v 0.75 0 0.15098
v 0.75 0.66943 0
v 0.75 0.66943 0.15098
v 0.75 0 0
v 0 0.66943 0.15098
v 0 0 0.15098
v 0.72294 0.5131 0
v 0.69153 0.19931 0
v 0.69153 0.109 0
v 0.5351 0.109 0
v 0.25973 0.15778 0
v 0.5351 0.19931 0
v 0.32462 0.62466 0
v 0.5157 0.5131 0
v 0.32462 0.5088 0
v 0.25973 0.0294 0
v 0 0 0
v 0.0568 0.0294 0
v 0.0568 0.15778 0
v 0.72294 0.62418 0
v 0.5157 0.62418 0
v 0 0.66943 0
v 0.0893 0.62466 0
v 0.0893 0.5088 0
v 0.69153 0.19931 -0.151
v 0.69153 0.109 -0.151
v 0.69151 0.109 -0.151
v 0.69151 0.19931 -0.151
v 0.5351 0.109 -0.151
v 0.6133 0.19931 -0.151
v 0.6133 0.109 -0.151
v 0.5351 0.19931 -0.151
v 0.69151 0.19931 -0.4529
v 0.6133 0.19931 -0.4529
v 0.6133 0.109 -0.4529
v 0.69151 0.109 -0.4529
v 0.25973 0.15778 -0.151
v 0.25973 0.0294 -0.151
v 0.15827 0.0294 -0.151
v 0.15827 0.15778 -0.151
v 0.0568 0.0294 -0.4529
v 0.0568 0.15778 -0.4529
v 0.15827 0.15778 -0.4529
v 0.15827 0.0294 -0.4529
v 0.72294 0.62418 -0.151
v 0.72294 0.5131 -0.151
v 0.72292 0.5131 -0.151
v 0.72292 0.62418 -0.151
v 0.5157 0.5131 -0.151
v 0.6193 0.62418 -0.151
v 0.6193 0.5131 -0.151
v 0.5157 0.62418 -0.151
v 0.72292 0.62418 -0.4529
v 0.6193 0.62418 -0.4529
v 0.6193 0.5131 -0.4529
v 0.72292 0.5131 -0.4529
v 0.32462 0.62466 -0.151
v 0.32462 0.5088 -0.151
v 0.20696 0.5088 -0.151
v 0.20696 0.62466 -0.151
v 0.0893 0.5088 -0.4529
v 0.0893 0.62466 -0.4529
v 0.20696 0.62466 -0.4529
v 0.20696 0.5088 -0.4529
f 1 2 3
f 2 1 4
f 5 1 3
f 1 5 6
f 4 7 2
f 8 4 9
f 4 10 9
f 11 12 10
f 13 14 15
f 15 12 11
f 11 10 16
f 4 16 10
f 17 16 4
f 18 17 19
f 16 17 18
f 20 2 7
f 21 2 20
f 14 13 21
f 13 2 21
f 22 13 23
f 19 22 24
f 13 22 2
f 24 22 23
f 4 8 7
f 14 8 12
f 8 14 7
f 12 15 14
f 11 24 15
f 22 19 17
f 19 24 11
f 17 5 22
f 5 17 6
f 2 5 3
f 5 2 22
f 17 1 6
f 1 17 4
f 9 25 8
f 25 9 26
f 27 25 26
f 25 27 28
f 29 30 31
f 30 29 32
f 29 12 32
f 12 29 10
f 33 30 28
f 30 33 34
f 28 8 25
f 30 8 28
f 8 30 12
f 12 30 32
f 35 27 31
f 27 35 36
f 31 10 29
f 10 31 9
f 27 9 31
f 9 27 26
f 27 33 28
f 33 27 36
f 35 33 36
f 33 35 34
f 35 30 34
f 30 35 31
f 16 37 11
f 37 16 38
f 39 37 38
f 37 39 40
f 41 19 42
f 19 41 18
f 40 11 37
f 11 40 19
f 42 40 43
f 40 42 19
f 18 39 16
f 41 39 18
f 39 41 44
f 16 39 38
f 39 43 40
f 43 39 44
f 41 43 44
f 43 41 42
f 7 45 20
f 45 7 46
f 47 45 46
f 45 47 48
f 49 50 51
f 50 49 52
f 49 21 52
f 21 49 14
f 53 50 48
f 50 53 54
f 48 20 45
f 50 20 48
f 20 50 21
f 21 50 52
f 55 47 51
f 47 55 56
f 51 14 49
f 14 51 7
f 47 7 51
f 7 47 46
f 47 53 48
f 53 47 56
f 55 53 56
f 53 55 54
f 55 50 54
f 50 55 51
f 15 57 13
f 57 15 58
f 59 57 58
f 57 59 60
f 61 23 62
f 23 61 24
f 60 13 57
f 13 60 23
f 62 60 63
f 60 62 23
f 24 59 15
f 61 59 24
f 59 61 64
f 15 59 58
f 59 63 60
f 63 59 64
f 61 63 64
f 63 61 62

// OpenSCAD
// Base dimensions
base_length = 0.75;
base_width = 0.669426;
base_height = 0.150979;

// Pad depth parameters
shallow_depth = 0.151;
deep_start_below = 0.1509;
deep_end_below = 0.4529;
deep_depth = deep_end_below - deep_start_below; // 0.302

// Pad 1 shallow
p1_s_x = 0.156427;
p1_s_y = 0.090313;
p1_s_left = 0.5351;
p1_s_front = 0.109;

// Pad 1 deep
p1_d_x = 0.078214;
p1_d_y = 0.090313;
p1_d_left = 0.6133;
p1_d_front = 0.109;

// Pad 2 shallow
p2_s_x = 0.202932;
p2_s_y = 0.128382;
p2_s_left = 0.0568;
p2_s_front = 0.0294;

// Pad 2 deep
p2_d_x = 0.101466;
p2_d_y = 0.128382;
p2_d_left = 0.0568;
p2_d_front = 0.0294;

// Pad 3 shallow
p3_s_x = 0.207237;
p3_s_y = 0.111076;
p3_s_left = 0.5157;
p3_s_front = 0.5131;

// Pad 3 deep
p3_d_x = 0.103619;
p3_d_y = 0.111076;
p3_d_left = 0.6193;
p3_d_front = 0.5131;

// Pad 4 shallow
p4_s_x = 0.235324;
p4_s_y = 0.115862;
p4_s_left = 0.0893;
p4_s_front = 0.5088;

// Pad 4 deep
p4_d_x = 0.117662;
p4_d_y = 0.115862;
p4_d_left = 0.0893;
p4_d_front = 0.5088;

// Main base body
module base_body() {
    cube([base_length, base_width, base_height]);
}

// Shallow pad extending from base underside
module shallow_pad(left, front, w, d) {
    translate([left, front, -shallow_depth])
        cube([w, d, shallow_depth]);
}

// Deeper continuation pad
module deep_pad(left, front, w, d) {
    translate([left, front, -deep_end_below])
        cube([w, d, deep_depth]);
}

// Assemble solid model
union() {
    // Reference rectangular base
    base_body();

    // Pad 1 features
    shallow_pad(p1_s_left, p1_s_front, p1_s_x, p1_s_y);
    deep_pad(p1_d_left, p1_d_front, p1_d_x, p1_d_y);

    // Pad 2 features
    shallow_pad(p2_s_left, p2_s_front, p2_s_x, p2_s_y);
    deep_pad(p2_d_left, p2_d_front, p2_d_x, p2_d_y);

    // Pad 3 features
    shallow_pad(p3_s_left, p3_s_front, p3_s_x, p3_s_y);
    deep_pad(p3_d_left, p3_d_front, p3_d_x, p3_d_y);

    // Pad 4 features
    shallow_pad(p4_s_left, p4_s_front, p4_s_x, p4_s_y);
    deep_pad(p4_d_left, p4_d_front, p4_d_x, p4_d_y);
}
